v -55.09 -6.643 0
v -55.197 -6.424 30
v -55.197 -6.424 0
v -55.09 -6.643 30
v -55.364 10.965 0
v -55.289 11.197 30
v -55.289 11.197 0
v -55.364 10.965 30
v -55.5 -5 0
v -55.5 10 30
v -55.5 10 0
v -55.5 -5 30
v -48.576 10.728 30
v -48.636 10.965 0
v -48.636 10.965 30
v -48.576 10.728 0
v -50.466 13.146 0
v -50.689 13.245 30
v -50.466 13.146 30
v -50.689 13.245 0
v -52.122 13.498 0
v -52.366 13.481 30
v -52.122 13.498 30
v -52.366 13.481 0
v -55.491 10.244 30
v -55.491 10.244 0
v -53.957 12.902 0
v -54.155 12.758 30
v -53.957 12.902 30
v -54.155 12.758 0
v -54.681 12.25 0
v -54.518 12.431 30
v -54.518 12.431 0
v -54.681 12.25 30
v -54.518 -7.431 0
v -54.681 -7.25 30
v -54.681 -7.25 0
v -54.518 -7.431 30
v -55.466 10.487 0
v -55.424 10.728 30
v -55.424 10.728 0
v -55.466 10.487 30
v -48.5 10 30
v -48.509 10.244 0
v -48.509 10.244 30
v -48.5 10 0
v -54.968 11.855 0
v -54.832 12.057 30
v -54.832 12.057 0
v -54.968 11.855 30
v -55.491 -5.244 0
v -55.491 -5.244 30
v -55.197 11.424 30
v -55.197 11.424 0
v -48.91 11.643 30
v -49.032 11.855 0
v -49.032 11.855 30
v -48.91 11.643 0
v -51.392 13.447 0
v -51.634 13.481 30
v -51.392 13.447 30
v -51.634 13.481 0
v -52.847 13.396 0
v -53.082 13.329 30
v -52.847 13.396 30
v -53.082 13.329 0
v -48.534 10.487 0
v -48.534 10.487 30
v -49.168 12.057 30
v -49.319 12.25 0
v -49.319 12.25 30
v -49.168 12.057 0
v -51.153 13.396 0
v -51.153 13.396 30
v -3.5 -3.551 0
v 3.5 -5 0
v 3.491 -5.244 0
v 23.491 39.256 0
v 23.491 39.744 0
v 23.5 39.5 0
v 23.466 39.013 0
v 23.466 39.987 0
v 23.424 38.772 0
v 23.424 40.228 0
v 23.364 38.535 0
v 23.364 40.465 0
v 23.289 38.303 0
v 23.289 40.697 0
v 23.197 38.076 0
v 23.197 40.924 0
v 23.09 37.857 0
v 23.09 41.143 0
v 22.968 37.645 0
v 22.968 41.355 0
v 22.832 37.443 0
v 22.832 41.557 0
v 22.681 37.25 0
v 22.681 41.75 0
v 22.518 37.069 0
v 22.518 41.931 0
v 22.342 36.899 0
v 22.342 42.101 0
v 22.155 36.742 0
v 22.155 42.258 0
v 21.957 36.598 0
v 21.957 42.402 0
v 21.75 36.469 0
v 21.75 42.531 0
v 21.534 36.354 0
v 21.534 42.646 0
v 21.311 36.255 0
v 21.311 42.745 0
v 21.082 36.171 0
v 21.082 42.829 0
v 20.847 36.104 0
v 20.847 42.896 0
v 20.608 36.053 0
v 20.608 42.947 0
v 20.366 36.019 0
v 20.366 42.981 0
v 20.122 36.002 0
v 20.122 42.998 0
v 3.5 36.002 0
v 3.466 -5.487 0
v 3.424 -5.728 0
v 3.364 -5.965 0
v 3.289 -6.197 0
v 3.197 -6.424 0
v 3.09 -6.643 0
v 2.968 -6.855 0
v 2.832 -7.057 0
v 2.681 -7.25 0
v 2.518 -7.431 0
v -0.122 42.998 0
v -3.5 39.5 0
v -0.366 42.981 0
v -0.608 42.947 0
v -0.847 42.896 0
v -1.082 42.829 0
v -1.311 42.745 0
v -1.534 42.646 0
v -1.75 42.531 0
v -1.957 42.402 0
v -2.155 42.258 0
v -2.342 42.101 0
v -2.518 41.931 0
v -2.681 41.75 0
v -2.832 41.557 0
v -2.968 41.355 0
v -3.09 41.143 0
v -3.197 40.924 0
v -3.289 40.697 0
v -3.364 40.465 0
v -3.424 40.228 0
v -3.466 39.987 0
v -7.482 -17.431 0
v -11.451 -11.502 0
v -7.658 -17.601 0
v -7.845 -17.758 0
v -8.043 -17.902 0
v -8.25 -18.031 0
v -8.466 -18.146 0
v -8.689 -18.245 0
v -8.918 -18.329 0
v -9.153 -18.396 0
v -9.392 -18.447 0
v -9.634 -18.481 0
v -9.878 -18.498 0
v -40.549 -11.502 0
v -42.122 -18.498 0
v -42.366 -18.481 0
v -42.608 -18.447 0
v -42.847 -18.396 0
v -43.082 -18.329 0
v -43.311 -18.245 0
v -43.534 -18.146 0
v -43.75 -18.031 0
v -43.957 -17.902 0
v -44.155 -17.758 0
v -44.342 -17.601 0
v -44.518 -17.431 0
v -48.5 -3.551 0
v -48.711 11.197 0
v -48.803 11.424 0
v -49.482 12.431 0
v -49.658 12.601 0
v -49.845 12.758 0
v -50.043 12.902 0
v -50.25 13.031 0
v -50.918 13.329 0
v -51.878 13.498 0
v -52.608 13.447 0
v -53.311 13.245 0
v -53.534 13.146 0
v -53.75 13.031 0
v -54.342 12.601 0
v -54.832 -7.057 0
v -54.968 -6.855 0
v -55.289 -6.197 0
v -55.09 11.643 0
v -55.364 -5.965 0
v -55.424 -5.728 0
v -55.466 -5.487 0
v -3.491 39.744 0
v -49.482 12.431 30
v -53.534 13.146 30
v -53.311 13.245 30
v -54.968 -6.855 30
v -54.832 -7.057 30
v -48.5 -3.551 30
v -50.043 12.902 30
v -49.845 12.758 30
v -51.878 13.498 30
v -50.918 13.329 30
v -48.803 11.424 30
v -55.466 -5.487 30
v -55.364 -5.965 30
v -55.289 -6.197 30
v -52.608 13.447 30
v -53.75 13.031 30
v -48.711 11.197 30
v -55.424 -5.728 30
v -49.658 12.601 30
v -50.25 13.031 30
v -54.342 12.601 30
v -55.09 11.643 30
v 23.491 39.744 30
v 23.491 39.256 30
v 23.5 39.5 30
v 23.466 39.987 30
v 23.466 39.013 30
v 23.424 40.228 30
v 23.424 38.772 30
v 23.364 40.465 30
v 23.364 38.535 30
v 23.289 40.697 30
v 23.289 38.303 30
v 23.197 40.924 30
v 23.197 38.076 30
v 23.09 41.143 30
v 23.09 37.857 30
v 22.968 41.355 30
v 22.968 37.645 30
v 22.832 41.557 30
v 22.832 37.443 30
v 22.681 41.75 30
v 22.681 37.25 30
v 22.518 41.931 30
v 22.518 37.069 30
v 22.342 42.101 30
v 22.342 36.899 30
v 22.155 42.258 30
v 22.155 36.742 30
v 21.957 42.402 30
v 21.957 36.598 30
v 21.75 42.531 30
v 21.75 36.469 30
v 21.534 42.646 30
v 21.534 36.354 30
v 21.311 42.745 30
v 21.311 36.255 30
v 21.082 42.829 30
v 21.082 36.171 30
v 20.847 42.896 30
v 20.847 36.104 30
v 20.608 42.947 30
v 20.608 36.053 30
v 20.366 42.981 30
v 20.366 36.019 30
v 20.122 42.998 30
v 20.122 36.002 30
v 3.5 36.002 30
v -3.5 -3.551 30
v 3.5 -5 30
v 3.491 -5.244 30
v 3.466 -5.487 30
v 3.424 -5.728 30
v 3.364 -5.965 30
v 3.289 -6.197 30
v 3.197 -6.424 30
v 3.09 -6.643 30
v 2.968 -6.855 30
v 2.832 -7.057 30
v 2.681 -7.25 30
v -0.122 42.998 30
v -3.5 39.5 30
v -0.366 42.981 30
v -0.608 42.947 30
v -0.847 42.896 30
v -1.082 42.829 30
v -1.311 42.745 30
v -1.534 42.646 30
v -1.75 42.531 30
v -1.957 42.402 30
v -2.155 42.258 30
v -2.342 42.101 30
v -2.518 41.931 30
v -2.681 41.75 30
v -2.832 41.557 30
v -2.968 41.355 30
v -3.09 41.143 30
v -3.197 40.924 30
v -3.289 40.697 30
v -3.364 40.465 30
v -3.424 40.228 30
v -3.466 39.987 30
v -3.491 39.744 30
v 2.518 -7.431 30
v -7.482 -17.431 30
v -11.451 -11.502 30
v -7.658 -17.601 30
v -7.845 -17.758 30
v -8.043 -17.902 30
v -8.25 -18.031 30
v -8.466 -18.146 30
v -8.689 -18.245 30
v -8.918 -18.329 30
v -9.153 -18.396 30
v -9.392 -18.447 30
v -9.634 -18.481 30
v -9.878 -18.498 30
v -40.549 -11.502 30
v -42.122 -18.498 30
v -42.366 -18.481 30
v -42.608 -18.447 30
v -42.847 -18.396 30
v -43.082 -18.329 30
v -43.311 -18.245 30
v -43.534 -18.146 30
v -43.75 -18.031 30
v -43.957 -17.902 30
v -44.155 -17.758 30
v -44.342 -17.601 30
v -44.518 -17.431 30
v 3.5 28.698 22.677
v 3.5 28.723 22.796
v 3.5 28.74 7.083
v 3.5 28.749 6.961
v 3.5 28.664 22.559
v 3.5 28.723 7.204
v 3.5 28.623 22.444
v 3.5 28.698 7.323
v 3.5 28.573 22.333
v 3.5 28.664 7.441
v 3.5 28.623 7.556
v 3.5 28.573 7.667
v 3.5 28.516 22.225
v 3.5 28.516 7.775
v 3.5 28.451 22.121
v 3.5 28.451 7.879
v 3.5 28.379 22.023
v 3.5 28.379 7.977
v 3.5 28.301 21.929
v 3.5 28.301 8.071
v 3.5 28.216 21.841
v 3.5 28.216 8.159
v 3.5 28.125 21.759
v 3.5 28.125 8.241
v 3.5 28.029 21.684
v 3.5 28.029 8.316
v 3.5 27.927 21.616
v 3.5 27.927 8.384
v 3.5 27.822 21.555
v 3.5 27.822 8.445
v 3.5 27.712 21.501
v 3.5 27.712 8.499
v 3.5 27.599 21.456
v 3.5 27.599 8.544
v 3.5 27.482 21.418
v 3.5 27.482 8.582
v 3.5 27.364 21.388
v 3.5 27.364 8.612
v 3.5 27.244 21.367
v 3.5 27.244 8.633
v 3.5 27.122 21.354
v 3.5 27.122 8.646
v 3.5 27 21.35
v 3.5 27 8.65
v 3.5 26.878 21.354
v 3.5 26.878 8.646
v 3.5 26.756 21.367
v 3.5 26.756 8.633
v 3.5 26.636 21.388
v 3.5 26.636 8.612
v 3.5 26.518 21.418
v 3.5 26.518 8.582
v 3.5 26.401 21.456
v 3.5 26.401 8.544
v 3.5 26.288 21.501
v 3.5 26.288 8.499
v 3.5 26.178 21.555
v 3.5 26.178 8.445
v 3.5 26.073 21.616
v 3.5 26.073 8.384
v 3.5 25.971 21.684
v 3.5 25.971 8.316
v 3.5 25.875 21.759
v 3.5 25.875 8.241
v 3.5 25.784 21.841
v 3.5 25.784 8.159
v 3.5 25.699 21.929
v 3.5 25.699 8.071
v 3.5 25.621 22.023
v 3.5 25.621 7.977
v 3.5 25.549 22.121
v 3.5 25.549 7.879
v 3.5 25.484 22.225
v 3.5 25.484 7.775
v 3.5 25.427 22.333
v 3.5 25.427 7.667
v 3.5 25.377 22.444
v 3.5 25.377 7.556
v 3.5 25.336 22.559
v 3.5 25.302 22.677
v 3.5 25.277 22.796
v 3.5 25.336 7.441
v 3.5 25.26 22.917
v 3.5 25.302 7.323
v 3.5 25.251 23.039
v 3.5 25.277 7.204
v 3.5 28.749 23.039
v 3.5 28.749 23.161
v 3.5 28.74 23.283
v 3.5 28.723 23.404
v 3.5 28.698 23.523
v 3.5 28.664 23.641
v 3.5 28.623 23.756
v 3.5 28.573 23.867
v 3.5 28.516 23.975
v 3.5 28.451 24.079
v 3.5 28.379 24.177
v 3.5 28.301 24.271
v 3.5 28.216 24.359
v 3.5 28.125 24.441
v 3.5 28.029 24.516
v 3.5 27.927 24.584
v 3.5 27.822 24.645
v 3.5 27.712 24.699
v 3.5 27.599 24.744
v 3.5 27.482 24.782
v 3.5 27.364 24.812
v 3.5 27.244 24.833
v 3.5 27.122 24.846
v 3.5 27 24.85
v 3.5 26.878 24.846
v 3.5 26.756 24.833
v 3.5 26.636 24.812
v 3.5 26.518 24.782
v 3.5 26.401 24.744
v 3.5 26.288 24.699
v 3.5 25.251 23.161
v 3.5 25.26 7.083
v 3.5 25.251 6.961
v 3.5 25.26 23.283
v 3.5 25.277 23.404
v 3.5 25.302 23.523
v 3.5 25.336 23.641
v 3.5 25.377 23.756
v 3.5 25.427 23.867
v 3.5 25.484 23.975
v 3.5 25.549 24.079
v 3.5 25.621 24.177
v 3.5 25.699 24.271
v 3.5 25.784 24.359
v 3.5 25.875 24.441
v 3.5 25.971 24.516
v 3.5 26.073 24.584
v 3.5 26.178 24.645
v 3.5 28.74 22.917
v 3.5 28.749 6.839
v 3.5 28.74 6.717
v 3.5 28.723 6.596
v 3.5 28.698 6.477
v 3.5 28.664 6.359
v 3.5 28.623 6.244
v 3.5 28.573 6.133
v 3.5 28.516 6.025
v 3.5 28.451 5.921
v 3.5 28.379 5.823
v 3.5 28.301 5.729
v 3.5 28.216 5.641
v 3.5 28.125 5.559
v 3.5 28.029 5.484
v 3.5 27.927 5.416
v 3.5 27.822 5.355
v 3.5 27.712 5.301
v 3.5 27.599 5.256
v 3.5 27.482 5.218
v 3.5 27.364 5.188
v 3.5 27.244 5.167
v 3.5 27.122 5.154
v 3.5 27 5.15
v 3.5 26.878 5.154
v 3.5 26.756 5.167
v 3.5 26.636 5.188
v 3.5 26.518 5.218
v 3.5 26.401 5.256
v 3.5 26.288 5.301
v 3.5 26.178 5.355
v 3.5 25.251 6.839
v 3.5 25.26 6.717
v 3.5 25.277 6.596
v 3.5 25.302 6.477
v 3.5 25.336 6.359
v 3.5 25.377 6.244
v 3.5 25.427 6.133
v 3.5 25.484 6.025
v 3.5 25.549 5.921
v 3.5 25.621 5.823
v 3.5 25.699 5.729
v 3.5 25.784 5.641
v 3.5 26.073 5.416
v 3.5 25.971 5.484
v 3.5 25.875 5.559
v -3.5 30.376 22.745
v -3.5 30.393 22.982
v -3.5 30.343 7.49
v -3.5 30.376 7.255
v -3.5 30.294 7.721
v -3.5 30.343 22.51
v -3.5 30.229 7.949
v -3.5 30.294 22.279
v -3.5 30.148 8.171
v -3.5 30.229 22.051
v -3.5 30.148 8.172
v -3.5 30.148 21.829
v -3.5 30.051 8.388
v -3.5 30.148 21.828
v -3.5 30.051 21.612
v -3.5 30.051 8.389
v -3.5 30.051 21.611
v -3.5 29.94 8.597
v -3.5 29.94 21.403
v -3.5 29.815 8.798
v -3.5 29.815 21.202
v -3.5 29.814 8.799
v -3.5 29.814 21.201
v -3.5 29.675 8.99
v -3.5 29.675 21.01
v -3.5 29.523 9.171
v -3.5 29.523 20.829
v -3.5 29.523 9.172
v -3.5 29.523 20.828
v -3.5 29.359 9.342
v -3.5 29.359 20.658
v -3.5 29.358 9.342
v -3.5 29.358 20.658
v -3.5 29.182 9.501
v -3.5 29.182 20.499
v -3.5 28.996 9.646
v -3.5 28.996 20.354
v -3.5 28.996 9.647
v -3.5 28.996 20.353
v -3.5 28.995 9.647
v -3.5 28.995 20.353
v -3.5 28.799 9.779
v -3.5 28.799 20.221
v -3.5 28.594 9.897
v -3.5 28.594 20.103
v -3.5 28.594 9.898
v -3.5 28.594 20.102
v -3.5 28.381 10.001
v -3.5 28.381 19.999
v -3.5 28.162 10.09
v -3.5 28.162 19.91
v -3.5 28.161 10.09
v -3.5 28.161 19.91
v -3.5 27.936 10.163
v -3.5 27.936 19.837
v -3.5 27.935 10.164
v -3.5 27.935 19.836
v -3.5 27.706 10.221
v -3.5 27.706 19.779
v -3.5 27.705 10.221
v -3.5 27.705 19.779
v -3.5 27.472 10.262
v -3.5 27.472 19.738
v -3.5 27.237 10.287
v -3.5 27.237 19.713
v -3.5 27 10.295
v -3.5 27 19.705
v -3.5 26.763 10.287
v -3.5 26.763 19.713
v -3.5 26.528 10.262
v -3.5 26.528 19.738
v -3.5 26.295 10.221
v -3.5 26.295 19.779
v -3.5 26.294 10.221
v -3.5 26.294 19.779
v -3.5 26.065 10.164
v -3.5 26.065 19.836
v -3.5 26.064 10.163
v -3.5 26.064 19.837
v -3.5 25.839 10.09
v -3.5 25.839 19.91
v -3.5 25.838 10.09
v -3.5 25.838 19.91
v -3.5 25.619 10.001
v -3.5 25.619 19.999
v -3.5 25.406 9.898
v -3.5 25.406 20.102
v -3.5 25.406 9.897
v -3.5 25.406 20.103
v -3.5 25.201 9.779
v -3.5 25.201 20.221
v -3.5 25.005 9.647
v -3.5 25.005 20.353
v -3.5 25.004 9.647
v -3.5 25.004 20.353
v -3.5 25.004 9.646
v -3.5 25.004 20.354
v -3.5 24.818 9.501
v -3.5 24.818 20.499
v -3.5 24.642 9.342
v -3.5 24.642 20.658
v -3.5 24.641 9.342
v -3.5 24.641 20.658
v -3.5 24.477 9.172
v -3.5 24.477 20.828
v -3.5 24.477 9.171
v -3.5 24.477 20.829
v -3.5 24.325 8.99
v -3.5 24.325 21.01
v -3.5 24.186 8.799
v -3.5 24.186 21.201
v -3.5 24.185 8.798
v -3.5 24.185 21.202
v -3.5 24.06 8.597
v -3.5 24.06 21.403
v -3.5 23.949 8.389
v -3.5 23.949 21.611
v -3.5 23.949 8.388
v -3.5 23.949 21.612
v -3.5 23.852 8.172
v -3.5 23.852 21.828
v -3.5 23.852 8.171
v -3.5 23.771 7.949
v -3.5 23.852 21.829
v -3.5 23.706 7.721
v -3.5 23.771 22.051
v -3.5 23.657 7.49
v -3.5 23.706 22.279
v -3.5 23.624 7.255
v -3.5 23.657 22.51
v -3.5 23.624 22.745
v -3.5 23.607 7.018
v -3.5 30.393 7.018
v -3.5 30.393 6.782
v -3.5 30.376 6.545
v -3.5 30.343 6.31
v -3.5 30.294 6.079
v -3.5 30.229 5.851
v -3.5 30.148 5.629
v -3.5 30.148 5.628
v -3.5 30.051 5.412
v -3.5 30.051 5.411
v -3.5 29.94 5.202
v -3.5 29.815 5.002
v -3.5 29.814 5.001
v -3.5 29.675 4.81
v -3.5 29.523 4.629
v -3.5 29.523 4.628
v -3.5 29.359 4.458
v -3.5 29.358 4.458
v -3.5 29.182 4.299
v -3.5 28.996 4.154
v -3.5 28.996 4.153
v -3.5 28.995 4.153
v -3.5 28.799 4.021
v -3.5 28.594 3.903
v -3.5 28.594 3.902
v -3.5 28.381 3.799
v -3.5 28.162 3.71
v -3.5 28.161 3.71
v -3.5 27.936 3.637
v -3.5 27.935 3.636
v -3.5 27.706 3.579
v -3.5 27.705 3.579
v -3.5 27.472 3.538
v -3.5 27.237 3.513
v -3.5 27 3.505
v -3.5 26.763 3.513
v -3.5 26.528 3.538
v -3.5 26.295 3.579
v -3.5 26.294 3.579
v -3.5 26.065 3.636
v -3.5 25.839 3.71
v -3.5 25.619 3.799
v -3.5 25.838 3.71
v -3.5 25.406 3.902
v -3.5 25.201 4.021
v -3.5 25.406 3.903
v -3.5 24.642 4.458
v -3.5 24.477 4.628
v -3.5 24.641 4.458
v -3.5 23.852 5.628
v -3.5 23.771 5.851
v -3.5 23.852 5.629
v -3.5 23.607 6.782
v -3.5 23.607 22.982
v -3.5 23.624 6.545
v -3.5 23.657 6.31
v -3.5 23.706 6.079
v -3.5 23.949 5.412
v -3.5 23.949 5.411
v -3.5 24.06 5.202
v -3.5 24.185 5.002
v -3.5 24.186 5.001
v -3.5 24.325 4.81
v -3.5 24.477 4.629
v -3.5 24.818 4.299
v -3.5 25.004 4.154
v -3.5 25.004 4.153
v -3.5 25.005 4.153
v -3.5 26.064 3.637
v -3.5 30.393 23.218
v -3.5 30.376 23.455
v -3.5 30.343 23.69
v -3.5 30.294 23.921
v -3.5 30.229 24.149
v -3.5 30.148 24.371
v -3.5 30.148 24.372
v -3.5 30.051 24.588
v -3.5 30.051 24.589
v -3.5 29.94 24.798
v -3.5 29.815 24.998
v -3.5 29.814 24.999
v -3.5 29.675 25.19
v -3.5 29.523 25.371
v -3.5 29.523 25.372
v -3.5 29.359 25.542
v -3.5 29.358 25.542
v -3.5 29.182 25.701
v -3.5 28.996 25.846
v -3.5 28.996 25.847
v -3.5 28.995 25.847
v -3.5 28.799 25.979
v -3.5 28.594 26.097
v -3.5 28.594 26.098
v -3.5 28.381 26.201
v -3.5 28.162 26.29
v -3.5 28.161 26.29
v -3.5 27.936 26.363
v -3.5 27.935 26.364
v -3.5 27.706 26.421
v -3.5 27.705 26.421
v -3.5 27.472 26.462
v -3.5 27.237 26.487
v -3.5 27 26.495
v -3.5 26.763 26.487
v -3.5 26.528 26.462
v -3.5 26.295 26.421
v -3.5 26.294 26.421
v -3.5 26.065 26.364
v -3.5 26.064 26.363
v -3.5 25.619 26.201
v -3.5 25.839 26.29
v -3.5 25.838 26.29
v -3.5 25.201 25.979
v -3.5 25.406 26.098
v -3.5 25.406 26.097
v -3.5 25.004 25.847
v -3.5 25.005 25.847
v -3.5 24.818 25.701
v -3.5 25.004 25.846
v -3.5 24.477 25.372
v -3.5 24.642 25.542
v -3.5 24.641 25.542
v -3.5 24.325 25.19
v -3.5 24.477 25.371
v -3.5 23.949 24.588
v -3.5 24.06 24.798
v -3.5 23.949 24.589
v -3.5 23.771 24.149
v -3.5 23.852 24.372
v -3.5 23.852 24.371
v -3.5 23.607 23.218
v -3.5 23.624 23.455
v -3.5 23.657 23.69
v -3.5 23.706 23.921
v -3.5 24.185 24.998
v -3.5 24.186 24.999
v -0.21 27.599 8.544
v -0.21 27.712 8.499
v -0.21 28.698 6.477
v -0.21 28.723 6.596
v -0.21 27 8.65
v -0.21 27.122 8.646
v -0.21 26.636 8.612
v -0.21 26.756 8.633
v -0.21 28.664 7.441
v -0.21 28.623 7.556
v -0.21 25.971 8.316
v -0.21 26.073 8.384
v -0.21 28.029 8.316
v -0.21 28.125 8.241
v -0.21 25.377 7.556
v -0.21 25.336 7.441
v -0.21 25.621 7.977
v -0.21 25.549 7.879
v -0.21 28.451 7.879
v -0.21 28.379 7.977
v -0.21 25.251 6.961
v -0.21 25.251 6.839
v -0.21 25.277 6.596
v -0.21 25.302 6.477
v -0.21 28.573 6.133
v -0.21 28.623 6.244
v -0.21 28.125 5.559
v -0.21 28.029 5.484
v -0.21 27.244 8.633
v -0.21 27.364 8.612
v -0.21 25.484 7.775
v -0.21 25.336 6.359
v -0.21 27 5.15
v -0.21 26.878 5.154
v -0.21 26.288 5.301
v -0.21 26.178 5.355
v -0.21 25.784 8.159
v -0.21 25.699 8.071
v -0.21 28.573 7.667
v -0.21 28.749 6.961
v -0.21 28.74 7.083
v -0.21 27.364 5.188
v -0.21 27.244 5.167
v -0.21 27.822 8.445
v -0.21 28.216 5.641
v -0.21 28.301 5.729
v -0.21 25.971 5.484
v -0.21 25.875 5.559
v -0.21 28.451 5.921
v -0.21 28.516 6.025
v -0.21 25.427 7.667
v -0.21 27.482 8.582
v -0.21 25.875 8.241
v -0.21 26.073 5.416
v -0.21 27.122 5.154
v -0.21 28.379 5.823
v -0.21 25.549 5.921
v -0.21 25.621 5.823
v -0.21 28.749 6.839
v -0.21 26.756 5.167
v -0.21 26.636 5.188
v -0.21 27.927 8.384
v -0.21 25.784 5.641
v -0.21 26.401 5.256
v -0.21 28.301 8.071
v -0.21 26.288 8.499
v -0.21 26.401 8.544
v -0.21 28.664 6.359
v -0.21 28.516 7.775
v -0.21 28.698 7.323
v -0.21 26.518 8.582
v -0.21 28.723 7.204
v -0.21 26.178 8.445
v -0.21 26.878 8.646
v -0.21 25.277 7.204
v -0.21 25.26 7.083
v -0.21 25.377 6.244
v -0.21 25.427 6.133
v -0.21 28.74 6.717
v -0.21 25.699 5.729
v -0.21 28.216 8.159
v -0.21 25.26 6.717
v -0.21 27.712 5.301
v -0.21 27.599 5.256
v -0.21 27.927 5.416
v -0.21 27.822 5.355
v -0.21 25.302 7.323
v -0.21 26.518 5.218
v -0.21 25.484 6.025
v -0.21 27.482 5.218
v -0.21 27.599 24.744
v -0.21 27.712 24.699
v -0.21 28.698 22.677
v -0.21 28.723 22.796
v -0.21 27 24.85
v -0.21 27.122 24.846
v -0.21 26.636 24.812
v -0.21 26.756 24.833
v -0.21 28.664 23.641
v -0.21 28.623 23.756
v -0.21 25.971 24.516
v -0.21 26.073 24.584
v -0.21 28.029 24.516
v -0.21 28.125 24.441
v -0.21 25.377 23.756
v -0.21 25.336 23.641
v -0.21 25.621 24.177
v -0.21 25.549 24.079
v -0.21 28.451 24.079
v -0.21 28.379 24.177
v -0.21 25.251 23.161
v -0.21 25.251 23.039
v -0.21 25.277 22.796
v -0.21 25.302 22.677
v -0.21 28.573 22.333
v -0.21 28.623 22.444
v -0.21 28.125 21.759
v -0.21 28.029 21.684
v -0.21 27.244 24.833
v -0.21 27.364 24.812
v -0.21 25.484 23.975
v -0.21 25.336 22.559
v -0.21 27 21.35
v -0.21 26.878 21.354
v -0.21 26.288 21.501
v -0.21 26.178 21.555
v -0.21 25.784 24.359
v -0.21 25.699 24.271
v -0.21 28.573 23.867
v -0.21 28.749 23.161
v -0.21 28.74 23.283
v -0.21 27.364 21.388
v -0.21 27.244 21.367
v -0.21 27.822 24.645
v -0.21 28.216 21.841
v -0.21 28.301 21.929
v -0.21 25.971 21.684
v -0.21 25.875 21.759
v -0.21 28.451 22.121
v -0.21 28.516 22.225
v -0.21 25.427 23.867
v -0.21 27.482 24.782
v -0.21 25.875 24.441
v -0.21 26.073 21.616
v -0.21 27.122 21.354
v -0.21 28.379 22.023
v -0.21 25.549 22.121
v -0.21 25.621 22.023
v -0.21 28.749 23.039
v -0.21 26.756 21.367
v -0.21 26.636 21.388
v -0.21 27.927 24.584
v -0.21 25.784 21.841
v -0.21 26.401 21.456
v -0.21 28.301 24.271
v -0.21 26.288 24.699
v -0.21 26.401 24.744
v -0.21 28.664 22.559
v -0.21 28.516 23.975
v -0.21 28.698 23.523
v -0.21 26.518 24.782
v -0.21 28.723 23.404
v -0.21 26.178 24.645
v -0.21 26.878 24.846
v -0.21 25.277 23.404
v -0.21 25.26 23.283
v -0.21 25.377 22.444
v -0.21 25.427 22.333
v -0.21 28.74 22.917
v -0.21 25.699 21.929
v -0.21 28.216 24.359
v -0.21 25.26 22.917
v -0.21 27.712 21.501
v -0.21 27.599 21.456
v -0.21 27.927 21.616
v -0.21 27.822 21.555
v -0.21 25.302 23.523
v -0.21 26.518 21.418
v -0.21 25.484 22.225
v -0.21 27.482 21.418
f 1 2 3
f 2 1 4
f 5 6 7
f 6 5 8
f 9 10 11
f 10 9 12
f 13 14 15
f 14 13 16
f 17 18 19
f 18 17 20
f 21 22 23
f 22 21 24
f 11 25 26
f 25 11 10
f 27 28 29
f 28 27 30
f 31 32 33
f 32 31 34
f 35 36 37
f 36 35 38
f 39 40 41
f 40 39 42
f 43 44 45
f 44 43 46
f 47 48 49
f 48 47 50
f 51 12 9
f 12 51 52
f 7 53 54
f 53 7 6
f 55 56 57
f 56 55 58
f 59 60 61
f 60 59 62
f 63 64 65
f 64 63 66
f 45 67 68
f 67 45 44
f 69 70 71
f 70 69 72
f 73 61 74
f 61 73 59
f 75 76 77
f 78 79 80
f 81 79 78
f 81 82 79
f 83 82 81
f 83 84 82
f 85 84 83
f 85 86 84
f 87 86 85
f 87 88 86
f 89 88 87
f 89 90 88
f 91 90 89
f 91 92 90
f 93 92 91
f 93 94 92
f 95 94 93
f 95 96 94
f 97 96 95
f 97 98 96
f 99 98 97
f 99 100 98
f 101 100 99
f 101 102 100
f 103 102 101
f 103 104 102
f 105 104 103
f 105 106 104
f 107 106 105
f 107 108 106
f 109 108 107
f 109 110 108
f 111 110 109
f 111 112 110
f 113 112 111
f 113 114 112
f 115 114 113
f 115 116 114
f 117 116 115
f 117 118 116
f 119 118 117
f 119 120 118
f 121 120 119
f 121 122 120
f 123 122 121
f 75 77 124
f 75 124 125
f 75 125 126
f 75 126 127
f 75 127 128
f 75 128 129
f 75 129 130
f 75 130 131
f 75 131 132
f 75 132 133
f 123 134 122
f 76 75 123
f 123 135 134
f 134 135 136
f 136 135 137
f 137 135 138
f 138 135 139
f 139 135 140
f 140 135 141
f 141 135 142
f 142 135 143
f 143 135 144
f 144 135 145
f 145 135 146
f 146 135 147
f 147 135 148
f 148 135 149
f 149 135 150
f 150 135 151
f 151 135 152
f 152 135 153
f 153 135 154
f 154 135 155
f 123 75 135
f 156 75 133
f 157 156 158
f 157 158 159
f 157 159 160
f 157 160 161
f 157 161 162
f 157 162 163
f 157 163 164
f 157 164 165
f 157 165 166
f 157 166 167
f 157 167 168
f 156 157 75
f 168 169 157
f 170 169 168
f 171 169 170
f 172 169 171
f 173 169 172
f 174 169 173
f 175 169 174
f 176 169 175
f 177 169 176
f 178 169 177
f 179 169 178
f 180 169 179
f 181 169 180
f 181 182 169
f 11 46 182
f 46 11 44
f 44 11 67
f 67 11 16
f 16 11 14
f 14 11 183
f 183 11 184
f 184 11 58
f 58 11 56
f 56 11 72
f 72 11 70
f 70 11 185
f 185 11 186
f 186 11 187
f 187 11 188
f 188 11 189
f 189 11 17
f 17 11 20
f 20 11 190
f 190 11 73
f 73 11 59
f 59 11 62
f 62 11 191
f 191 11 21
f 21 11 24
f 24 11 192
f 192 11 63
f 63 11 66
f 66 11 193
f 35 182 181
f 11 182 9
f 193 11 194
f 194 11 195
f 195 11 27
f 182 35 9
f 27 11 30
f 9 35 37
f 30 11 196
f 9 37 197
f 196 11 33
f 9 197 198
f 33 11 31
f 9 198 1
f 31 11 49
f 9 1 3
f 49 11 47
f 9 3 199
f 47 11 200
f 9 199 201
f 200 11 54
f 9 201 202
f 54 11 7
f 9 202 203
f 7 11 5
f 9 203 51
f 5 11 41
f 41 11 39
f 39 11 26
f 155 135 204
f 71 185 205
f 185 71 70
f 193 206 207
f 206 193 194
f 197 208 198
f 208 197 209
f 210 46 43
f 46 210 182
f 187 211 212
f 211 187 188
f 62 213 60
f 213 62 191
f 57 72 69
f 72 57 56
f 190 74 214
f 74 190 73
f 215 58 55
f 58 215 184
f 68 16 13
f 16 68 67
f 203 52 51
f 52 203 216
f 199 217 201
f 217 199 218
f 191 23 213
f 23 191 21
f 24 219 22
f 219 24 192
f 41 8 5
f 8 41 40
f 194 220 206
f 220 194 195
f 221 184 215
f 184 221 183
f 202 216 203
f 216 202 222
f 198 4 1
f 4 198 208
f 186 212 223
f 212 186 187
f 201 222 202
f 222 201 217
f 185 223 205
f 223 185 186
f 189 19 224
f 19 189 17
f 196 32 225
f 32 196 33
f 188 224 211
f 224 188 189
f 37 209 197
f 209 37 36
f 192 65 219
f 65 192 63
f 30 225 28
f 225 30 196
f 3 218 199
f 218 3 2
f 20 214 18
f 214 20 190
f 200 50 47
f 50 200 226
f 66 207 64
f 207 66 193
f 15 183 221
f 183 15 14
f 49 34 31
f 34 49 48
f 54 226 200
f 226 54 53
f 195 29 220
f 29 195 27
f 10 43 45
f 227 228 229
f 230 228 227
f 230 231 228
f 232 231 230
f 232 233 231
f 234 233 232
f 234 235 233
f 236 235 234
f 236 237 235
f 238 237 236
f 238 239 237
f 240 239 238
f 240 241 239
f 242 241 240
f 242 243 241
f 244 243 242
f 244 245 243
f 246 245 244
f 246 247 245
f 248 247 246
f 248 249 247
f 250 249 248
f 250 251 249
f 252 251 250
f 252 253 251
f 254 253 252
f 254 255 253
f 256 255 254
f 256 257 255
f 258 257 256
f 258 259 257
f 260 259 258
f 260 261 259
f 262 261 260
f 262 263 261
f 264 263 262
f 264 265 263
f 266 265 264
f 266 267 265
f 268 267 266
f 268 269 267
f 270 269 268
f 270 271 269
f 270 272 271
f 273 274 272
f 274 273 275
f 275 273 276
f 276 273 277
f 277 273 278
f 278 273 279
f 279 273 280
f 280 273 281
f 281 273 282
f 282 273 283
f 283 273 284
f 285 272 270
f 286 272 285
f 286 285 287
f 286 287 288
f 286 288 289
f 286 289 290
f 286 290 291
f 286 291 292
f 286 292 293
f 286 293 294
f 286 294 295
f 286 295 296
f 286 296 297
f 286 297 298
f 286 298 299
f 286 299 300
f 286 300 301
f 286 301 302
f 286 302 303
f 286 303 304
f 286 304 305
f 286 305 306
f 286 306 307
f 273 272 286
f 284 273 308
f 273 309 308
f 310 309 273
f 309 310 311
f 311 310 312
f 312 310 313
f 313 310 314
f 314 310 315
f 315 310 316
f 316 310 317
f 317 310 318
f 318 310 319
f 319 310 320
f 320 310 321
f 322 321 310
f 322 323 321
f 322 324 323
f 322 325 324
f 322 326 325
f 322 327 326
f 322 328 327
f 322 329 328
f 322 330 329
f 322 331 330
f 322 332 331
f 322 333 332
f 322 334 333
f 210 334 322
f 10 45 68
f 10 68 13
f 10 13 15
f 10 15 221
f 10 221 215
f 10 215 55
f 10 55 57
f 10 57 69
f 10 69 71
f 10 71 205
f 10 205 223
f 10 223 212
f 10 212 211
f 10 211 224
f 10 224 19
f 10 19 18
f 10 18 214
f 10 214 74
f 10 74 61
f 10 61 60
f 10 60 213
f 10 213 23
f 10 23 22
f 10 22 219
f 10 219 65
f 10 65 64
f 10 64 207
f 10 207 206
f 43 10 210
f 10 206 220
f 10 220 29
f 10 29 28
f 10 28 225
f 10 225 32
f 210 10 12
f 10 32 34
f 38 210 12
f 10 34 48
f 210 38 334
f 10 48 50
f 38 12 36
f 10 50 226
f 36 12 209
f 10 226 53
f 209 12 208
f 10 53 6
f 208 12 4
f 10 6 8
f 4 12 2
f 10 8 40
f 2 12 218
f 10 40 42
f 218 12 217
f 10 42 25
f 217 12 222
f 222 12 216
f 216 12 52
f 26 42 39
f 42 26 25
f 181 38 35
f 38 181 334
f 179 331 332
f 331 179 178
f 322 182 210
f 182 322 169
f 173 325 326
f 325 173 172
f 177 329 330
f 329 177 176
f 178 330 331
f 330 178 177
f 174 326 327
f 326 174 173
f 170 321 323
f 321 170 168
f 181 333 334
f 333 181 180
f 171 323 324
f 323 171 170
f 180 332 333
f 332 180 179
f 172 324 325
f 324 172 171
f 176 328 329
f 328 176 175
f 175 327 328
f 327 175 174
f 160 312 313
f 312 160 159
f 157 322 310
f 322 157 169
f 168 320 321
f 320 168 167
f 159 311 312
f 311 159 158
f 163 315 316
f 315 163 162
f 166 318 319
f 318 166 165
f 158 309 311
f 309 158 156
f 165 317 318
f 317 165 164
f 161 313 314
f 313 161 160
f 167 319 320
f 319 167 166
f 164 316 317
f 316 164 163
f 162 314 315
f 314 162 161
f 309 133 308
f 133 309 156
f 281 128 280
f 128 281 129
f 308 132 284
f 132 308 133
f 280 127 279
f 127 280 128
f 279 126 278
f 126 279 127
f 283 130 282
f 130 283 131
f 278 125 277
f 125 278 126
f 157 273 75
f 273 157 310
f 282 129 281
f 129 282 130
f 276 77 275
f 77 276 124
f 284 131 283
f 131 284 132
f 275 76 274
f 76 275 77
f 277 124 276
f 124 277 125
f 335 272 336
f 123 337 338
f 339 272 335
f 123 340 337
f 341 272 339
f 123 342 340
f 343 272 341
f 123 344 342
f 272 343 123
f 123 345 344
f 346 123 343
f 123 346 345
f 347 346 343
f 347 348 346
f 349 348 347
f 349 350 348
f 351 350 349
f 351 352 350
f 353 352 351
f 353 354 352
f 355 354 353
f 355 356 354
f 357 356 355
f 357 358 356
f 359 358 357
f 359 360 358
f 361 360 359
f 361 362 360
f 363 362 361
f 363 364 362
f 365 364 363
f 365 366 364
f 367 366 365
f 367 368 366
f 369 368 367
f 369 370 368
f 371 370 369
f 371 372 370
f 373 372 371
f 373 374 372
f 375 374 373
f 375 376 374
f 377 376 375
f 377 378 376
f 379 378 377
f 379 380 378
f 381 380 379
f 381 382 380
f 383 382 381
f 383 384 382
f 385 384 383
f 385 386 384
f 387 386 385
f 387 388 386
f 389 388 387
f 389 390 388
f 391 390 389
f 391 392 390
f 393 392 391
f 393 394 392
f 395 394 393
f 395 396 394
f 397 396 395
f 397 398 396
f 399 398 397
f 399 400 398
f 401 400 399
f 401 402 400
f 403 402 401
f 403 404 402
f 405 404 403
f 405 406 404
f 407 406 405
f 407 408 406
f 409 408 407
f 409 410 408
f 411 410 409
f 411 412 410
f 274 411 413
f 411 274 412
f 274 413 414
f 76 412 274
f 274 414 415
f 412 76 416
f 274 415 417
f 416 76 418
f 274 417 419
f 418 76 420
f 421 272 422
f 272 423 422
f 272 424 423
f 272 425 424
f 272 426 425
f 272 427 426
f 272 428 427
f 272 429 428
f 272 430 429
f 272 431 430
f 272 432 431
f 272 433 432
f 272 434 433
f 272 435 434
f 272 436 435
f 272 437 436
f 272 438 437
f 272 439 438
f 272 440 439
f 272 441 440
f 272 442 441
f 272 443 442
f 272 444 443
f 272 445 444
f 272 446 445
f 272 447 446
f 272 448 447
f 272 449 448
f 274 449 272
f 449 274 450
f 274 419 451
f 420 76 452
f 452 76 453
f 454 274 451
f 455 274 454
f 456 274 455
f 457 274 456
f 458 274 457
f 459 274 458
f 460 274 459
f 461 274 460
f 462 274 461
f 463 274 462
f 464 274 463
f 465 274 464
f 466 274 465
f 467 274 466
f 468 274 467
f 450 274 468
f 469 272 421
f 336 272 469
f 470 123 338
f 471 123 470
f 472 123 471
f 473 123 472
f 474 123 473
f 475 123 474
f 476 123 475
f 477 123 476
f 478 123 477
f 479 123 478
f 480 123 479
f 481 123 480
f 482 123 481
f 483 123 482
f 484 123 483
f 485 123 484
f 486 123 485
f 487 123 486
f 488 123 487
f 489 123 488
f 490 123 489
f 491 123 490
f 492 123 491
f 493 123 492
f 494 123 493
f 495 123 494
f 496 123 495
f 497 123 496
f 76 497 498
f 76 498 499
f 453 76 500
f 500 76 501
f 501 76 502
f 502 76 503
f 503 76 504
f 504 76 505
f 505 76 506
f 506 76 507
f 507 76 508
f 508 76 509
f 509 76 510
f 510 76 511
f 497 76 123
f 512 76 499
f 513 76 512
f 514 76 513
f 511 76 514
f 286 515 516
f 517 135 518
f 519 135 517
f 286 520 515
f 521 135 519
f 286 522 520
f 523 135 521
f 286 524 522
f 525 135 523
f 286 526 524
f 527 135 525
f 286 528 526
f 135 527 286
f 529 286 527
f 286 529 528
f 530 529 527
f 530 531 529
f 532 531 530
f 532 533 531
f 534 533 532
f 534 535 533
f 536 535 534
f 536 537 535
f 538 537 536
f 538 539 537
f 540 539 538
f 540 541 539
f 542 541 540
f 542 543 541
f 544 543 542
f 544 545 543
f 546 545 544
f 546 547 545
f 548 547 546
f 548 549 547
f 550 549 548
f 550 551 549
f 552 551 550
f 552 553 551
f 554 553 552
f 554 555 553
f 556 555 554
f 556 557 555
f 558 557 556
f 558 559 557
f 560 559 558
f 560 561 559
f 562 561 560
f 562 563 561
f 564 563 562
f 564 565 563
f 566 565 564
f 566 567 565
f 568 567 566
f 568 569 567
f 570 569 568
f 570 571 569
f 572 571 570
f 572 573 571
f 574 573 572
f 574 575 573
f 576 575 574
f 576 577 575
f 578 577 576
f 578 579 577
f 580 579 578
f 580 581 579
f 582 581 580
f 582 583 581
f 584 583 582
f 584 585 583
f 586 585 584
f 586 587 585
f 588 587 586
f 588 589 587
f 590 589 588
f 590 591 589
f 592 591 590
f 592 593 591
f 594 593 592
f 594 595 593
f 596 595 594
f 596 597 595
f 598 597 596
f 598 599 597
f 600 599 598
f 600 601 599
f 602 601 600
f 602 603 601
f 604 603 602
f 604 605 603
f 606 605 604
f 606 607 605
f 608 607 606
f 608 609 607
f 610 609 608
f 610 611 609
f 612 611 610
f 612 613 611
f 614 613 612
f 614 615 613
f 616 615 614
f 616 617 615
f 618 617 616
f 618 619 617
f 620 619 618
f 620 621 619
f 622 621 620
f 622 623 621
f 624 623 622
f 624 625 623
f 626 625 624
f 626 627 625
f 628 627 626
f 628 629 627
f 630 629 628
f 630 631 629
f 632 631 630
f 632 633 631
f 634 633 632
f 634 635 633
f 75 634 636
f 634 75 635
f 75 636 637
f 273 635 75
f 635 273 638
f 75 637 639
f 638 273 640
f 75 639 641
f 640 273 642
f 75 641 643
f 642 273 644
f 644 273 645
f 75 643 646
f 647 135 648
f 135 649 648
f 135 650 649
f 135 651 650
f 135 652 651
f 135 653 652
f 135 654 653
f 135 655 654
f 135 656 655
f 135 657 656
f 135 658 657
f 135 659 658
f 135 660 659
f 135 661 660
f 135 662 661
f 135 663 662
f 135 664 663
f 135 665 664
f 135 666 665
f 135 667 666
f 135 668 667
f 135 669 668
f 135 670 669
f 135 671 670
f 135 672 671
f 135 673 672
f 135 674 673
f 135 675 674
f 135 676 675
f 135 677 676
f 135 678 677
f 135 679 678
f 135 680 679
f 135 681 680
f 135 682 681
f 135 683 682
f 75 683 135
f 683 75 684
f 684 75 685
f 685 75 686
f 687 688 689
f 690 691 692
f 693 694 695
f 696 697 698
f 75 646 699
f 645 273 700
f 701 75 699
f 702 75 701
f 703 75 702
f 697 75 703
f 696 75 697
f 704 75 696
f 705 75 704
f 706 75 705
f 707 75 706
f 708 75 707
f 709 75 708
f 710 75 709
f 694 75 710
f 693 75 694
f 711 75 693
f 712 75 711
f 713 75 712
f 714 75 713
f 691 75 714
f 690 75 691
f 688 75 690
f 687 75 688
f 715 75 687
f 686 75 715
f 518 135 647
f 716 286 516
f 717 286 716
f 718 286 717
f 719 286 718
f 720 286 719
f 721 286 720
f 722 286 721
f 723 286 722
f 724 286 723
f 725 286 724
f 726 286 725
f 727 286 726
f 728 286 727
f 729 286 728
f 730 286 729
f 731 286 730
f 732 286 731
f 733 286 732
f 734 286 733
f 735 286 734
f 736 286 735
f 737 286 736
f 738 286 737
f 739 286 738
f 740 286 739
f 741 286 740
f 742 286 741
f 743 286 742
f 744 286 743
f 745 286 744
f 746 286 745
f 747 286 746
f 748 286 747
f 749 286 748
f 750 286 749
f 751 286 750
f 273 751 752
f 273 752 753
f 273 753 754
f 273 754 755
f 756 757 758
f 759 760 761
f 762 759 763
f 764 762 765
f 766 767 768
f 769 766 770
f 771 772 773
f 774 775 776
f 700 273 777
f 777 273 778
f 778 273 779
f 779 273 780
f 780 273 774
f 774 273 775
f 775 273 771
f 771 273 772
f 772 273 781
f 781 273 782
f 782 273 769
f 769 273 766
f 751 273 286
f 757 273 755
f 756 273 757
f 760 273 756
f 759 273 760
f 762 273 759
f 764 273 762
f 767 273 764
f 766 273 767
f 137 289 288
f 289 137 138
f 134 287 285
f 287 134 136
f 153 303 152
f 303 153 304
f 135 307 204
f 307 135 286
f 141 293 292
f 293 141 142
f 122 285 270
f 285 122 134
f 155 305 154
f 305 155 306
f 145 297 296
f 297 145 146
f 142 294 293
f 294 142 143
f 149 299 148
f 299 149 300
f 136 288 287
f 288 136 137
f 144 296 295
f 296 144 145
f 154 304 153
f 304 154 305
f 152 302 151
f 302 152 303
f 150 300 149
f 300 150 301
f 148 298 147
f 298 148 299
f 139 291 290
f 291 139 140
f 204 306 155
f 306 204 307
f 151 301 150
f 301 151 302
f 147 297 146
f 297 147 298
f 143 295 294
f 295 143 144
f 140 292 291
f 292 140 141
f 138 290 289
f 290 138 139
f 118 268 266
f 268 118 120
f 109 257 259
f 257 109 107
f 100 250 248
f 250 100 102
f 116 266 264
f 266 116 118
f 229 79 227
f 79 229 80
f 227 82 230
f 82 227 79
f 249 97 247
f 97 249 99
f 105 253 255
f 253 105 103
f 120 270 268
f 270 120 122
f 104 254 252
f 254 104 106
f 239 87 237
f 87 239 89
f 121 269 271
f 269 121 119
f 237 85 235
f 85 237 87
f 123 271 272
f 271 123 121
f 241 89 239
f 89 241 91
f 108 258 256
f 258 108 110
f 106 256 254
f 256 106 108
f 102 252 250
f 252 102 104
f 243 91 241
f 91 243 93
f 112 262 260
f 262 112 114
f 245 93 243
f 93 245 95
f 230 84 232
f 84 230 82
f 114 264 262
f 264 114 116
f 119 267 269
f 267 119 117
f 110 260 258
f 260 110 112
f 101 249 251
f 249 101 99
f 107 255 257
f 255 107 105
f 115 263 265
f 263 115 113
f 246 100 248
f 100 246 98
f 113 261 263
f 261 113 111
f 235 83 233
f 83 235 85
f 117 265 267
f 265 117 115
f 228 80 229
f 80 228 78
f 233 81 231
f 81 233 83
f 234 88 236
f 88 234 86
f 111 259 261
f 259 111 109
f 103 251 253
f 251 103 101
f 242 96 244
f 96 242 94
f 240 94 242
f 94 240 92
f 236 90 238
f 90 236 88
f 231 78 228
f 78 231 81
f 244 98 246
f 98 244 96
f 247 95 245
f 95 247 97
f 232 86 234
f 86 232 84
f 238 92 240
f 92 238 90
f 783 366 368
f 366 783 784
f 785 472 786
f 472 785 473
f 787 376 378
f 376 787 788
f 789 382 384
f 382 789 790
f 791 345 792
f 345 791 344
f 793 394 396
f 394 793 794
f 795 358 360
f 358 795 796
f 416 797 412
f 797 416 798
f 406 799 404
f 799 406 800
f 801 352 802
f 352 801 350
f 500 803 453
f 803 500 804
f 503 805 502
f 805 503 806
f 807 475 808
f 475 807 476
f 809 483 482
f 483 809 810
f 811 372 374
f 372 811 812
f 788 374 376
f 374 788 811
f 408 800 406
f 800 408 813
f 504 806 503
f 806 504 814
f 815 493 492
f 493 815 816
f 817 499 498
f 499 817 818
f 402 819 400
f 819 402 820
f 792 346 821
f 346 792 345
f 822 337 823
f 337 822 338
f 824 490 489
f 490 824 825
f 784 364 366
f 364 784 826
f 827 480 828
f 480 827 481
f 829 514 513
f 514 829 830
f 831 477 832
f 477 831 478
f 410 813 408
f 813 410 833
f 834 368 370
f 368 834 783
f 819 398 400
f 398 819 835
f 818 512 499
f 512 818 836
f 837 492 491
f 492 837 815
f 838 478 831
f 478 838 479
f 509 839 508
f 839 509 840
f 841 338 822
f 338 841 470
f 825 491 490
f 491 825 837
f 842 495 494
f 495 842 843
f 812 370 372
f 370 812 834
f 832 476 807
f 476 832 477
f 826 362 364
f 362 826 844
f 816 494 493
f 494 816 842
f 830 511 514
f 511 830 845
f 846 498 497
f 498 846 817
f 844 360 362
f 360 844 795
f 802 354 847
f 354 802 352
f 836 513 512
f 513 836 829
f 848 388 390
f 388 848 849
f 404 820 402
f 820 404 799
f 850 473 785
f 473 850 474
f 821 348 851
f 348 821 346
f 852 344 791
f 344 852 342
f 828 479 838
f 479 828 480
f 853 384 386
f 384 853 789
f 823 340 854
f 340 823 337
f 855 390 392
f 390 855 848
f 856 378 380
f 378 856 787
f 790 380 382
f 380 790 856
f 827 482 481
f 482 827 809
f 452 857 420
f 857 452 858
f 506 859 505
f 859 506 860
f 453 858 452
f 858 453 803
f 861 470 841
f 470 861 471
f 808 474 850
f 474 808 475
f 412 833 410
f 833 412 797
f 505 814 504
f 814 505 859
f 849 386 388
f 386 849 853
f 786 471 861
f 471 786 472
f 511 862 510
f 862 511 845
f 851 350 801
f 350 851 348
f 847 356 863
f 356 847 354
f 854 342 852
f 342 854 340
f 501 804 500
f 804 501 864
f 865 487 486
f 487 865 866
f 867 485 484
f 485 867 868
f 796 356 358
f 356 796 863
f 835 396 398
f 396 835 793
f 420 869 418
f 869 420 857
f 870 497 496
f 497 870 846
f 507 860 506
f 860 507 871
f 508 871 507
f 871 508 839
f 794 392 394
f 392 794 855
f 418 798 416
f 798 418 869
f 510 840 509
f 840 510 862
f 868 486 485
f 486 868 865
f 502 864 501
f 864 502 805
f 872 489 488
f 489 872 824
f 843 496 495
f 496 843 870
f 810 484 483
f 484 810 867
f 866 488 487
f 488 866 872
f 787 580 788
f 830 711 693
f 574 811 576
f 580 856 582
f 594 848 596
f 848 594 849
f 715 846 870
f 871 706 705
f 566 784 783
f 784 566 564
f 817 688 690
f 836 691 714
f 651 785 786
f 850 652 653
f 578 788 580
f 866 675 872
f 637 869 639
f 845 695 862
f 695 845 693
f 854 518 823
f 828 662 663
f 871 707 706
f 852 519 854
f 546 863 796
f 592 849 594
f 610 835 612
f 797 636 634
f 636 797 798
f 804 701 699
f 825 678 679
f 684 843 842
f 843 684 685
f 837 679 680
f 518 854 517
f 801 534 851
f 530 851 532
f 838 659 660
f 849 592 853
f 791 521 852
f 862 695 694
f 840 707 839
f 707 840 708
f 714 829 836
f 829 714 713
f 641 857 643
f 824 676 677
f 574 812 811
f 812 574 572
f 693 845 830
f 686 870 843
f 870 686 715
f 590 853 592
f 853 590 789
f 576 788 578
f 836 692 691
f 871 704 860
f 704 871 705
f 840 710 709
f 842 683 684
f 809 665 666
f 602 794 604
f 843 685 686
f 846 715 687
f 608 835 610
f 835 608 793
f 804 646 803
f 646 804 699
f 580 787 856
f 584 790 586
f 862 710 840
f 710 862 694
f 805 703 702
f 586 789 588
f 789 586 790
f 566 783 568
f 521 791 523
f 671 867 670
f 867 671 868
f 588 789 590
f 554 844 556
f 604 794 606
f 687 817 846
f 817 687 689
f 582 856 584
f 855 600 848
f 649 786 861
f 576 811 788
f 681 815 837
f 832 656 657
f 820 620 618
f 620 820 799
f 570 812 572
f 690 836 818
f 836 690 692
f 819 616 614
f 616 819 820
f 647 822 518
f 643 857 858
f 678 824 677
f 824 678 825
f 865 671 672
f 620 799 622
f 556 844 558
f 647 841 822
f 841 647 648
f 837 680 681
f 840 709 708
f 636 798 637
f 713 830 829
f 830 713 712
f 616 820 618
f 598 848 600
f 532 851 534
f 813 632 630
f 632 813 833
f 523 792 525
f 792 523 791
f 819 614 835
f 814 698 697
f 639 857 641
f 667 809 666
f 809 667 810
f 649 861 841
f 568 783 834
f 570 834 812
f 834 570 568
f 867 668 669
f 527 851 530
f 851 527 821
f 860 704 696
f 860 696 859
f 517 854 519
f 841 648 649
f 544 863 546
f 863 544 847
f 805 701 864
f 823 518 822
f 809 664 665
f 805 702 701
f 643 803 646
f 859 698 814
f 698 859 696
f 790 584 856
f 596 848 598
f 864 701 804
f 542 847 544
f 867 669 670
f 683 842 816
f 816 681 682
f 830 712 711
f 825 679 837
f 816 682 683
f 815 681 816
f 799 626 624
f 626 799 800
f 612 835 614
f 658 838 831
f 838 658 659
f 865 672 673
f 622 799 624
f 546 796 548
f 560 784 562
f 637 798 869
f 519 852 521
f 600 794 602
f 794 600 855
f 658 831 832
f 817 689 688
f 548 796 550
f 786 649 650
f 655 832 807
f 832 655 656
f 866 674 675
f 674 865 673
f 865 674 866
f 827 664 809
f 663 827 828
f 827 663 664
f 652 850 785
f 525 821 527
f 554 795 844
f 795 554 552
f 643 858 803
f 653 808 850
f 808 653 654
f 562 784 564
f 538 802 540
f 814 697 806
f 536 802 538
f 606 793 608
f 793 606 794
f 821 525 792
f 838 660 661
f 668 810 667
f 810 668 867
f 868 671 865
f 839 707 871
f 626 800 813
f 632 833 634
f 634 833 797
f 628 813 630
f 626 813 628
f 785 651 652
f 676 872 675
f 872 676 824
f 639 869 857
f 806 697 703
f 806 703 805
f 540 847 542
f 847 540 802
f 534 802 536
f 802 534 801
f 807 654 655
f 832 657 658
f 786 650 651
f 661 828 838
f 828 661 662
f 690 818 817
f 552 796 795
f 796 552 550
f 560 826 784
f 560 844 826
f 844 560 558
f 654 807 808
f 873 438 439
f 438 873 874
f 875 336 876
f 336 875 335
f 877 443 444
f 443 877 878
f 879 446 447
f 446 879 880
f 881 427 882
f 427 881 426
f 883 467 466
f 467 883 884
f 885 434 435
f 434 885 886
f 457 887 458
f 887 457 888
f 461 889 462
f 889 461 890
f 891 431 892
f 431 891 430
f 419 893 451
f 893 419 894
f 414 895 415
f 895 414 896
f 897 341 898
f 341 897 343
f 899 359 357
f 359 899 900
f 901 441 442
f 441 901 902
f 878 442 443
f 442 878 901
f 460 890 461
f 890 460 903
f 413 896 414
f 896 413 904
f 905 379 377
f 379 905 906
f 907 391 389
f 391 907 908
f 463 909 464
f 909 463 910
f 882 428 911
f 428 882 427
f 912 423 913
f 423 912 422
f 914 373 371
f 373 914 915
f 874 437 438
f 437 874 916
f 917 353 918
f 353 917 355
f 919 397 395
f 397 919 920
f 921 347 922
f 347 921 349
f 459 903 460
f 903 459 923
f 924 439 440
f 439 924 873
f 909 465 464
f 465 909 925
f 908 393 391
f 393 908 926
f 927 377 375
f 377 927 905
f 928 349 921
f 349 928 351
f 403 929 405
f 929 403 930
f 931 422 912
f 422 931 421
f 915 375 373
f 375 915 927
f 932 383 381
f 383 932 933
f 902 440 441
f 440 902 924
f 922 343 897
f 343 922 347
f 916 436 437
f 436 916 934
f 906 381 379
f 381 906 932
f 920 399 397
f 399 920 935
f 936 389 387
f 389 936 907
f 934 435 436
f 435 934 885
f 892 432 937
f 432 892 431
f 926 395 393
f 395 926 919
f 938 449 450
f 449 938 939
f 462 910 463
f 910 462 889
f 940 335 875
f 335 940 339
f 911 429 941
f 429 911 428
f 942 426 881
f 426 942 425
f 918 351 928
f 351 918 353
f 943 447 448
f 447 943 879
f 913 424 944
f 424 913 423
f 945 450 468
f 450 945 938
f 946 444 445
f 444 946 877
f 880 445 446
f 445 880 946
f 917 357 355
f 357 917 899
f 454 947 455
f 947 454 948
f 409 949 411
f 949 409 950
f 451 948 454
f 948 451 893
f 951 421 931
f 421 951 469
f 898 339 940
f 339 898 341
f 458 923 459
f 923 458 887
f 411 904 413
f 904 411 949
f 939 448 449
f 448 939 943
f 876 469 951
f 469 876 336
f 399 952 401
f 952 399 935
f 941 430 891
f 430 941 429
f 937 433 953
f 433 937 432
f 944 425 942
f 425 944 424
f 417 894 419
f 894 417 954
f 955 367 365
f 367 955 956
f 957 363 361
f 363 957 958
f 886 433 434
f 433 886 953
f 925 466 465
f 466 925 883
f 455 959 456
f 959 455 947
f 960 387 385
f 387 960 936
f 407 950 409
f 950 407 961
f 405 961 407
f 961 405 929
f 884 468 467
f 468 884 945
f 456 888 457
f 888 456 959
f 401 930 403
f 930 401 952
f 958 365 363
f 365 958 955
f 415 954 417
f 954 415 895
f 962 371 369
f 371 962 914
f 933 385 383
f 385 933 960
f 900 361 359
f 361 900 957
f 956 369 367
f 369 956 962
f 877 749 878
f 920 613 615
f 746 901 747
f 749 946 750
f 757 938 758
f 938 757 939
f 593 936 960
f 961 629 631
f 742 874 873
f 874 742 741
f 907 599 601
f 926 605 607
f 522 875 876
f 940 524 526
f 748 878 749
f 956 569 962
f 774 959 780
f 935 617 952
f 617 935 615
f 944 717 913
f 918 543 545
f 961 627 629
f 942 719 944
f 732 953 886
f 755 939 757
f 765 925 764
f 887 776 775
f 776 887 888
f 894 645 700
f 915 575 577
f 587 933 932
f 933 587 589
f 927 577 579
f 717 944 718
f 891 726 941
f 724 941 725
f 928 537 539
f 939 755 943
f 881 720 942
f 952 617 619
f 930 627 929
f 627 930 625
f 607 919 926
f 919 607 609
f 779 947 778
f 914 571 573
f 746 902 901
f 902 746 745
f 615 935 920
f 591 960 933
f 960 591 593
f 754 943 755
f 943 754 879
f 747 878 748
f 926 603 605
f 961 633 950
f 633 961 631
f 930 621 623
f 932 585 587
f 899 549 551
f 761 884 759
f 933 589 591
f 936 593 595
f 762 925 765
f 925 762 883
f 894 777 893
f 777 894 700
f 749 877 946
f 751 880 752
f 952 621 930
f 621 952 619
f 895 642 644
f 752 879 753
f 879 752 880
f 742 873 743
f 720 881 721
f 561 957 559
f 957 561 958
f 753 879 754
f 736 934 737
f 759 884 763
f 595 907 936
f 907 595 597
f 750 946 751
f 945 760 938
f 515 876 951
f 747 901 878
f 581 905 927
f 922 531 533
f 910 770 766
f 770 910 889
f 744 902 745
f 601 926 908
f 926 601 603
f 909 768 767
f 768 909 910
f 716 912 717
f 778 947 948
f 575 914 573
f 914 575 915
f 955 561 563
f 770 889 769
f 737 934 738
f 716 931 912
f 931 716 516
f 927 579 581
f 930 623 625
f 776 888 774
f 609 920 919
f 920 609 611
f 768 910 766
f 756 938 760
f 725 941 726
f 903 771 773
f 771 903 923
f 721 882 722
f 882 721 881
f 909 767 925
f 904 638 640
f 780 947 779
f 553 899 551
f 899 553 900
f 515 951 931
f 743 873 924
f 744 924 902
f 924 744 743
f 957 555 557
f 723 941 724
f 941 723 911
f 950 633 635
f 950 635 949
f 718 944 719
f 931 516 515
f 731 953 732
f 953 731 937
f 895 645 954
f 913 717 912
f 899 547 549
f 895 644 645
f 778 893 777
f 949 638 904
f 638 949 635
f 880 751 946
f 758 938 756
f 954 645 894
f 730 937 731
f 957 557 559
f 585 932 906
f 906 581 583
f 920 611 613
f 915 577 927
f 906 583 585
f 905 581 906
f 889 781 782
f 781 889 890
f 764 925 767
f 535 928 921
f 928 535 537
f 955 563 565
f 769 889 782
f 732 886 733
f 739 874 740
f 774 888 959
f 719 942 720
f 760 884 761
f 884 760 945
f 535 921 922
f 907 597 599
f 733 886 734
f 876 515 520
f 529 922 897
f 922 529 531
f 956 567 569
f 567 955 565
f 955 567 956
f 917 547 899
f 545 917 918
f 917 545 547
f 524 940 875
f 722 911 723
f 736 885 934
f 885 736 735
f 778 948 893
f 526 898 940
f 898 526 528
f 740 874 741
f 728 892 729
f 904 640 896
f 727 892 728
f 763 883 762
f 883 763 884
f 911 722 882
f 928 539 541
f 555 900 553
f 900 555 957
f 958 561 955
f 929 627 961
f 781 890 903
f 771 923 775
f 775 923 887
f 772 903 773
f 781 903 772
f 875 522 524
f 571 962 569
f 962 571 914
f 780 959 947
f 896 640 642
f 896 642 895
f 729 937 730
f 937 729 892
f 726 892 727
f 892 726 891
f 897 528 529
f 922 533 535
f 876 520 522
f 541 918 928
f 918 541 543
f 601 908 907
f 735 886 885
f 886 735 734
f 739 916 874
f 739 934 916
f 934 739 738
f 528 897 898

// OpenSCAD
$fn = 90;
eps = 0.01;
tol_z = 0.5;
tol_xy = 0.1;

// wall parameters
// wall thickness
t = 7;
// wall height
h = 30;


// backpack hook parameters
// backpack hook lowering
bh_l = 10;
// backpack hook contact plane
bh_c = 35+t;

// screw block
sb_l = 2*18+t;
sh_o = 9+18;
sh_bo = t/2+2*18;
sh_d = 3.5;
sh_D = 6.8;

// headphones hook parameters
hh_l = 200-10;
hh_alpha = 25;
hh_x = -hh_l*sin(hh_alpha);
hh_y = hh_l*cos(hh_alpha);

// headphones hook interface width
hh_iw = 35+t;
hh_io = 10;
hh_ih = 25-hh_io;

// wooden piece parameters
wp_w = 16.1 + tol_z;
wp_t = 3.5 + tol_xy;
wp_d = 15;


// sole backpack holder
module backpack_hook()
{
    points = [  [0,hh_ih+hh_io,0],
                [0,hh_io,0],
                [hh_io,0,0],
                [hh_iw,0,0],
                [hh_io+hh_iw,hh_io,0],
                [hh_io+hh_iw,hh_io+hh_ih,0]];
    
    for(i=[0:len(points)-2])
    {
        translate([-hh_io-hh_iw,-hh_ih,0])
        hull()
        {
            translate(points[i]) cylinder(d=t,h=h);
            translate(points[i+1]) cylinder(d=t,h=h);
        }
    }    
    
}

//backpack_hook();

// helmet hook for the furniture
module helmet_hook(co=0,off=2*hh_ih)
{
    points = [  [0,hh_ih+hh_io,0],
                [0,hh_io,0],
                [hh_io,0,0],
                [hh_iw,0,0],
                [hh_io+hh_iw,hh_io,0],
                [hh_io+hh_iw,hh_io+hh_ih+off,0],
                [hh_io+hh_iw+18+t,hh_io+hh_ih+off],
                [hh_io+hh_iw+18+t,hh_io+hh_ih],];
    
    for(i=[0:len(points)-2-co])
    {
        translate([-hh_io-hh_iw,-hh_ih,0])
        hull()
        {
            translate(points[i]) cylinder(d=t,h=h);
            translate(points[i+1]) cylinder(d=t,h=h);
        }
    }
}

/*
helmet_hook();
*/
module helmet_hook_upper()
{
    difference()
    {
        helmet_hook();
        
        // hole for the wood piece
        _xo = (t-wp_t)/2;
        _zo = (h-wp_w)/2;
        translate([-_xo,-wp_d,_zo])
            cube([wp_t,2*wp_d,wp_w]);
        
        // hole for bolt
        translate([t/2+eps,0,h/2])
            rotate([0,-90,0])
                union()
                {
                    cylinder(h=6.5,d=2.2);
                    cylinder(h=1.5,d=3.8);                    
                }          
        
    }
}

/*
translate([75 ,0,0])
    helmet_hook_upper();
*/

module helmet_hook_lower()
{
    difference()
    {
        helmet_hook(co=2,off=65);
        
        translate([0,65,0])
        {
            // hole for the wood piece
            _xo = (t-wp_t)/2;
            _zo = (h-wp_w)/2;
            translate([-_xo,-wp_d,_zo])
                cube([wp_t,2*wp_d,wp_w]);
            
            // hole for bolt
            translate([t/2+eps,0,h/2])
                rotate([0,-90,0])
                    union()
                    {
                        cylinder(h=6.5,d=2.2);
                        cylinder(h=1.5,d=3.8);                    
                    }          
        }
    }   
}

/*
helmet_hook_lower();
*/

module screw_block()
{
    difference()
    {
        union()
        {
            // main screw block
            hull()
            {
                cylinder(d=t,h=h);
                translate([0,sb_l-t/2,0])
                    cylinder(d=t,h=h);
            }
            
            // border
            translate([0,sh_bo,0])
            {
                hull()
                {
                    cylinder(d=t,h=h);
                    translate([20,0,0])
                        cylinder(d=t,h=h);
                }
            }
        }
        
        // lower screw hole
        translate([t/2+eps,sh_o,t/2+sh_D/2])
            rotate([0,-90,0])
            {
                cylinder(d=sh_d,h=t+2*eps);
                translate([0,0,t-sh_D+sh_d+2*eps])
                    cylinder(d1=sh_d,d2=sh_D,h=sh_D-sh_d);
            }
        
        // upper screw hole
        translate([t/2+eps,sh_o,h-(t/2+sh_D/2)])
            rotate([0,-90,0])
            {
                cylinder(d=sh_d,h=t+2*eps);
                translate([0,0,t-sh_D+sh_d+2*eps])
                    cylinder(d1=sh_d,d2=sh_D,h=sh_D-sh_d);
            }
        
        // check hole
        //#cube([10,2*18,10]);
        //%cube([10,9+18,10]);
            
    }
    
    
}

//screw_block();

module headphone_hook()
{
    hull()
    {
        cylinder(h=h,d=t);
        translate([hh_x,hh_y,0])
            cylinder(h=h,d=t);
    }
    
    points = [  [0,hh_ih+hh_io,0],
                [0,hh_io,0],
                [hh_io,0,0],
                [hh_iw,0,0],
                [hh_io+hh_iw,hh_io,0],
                [hh_io+hh_iw,hh_io+hh_ih,0]];
    
    translate([hh_x-hh_iw/2-3,hh_y,0])
    {
        for(i=[0:len(points)-2])
        {
            hull()
            {
                translate(points[i]) cylinder(d=t,h=h);
                translate(points[i+1]) cylinder(d=t,h=h);
            }
        }   
    }
}

module headphones_and_backpack_hook()
{
    backpack_hook();
    screw_block();
    translate([0,sb_l-t/2,0])
        headphone_hook();
}

//headphones_and_backpack_hook();

module backpack_only_hook()
{
    backpack_hook();
    screw_block();
}

backpack_only_hook();
